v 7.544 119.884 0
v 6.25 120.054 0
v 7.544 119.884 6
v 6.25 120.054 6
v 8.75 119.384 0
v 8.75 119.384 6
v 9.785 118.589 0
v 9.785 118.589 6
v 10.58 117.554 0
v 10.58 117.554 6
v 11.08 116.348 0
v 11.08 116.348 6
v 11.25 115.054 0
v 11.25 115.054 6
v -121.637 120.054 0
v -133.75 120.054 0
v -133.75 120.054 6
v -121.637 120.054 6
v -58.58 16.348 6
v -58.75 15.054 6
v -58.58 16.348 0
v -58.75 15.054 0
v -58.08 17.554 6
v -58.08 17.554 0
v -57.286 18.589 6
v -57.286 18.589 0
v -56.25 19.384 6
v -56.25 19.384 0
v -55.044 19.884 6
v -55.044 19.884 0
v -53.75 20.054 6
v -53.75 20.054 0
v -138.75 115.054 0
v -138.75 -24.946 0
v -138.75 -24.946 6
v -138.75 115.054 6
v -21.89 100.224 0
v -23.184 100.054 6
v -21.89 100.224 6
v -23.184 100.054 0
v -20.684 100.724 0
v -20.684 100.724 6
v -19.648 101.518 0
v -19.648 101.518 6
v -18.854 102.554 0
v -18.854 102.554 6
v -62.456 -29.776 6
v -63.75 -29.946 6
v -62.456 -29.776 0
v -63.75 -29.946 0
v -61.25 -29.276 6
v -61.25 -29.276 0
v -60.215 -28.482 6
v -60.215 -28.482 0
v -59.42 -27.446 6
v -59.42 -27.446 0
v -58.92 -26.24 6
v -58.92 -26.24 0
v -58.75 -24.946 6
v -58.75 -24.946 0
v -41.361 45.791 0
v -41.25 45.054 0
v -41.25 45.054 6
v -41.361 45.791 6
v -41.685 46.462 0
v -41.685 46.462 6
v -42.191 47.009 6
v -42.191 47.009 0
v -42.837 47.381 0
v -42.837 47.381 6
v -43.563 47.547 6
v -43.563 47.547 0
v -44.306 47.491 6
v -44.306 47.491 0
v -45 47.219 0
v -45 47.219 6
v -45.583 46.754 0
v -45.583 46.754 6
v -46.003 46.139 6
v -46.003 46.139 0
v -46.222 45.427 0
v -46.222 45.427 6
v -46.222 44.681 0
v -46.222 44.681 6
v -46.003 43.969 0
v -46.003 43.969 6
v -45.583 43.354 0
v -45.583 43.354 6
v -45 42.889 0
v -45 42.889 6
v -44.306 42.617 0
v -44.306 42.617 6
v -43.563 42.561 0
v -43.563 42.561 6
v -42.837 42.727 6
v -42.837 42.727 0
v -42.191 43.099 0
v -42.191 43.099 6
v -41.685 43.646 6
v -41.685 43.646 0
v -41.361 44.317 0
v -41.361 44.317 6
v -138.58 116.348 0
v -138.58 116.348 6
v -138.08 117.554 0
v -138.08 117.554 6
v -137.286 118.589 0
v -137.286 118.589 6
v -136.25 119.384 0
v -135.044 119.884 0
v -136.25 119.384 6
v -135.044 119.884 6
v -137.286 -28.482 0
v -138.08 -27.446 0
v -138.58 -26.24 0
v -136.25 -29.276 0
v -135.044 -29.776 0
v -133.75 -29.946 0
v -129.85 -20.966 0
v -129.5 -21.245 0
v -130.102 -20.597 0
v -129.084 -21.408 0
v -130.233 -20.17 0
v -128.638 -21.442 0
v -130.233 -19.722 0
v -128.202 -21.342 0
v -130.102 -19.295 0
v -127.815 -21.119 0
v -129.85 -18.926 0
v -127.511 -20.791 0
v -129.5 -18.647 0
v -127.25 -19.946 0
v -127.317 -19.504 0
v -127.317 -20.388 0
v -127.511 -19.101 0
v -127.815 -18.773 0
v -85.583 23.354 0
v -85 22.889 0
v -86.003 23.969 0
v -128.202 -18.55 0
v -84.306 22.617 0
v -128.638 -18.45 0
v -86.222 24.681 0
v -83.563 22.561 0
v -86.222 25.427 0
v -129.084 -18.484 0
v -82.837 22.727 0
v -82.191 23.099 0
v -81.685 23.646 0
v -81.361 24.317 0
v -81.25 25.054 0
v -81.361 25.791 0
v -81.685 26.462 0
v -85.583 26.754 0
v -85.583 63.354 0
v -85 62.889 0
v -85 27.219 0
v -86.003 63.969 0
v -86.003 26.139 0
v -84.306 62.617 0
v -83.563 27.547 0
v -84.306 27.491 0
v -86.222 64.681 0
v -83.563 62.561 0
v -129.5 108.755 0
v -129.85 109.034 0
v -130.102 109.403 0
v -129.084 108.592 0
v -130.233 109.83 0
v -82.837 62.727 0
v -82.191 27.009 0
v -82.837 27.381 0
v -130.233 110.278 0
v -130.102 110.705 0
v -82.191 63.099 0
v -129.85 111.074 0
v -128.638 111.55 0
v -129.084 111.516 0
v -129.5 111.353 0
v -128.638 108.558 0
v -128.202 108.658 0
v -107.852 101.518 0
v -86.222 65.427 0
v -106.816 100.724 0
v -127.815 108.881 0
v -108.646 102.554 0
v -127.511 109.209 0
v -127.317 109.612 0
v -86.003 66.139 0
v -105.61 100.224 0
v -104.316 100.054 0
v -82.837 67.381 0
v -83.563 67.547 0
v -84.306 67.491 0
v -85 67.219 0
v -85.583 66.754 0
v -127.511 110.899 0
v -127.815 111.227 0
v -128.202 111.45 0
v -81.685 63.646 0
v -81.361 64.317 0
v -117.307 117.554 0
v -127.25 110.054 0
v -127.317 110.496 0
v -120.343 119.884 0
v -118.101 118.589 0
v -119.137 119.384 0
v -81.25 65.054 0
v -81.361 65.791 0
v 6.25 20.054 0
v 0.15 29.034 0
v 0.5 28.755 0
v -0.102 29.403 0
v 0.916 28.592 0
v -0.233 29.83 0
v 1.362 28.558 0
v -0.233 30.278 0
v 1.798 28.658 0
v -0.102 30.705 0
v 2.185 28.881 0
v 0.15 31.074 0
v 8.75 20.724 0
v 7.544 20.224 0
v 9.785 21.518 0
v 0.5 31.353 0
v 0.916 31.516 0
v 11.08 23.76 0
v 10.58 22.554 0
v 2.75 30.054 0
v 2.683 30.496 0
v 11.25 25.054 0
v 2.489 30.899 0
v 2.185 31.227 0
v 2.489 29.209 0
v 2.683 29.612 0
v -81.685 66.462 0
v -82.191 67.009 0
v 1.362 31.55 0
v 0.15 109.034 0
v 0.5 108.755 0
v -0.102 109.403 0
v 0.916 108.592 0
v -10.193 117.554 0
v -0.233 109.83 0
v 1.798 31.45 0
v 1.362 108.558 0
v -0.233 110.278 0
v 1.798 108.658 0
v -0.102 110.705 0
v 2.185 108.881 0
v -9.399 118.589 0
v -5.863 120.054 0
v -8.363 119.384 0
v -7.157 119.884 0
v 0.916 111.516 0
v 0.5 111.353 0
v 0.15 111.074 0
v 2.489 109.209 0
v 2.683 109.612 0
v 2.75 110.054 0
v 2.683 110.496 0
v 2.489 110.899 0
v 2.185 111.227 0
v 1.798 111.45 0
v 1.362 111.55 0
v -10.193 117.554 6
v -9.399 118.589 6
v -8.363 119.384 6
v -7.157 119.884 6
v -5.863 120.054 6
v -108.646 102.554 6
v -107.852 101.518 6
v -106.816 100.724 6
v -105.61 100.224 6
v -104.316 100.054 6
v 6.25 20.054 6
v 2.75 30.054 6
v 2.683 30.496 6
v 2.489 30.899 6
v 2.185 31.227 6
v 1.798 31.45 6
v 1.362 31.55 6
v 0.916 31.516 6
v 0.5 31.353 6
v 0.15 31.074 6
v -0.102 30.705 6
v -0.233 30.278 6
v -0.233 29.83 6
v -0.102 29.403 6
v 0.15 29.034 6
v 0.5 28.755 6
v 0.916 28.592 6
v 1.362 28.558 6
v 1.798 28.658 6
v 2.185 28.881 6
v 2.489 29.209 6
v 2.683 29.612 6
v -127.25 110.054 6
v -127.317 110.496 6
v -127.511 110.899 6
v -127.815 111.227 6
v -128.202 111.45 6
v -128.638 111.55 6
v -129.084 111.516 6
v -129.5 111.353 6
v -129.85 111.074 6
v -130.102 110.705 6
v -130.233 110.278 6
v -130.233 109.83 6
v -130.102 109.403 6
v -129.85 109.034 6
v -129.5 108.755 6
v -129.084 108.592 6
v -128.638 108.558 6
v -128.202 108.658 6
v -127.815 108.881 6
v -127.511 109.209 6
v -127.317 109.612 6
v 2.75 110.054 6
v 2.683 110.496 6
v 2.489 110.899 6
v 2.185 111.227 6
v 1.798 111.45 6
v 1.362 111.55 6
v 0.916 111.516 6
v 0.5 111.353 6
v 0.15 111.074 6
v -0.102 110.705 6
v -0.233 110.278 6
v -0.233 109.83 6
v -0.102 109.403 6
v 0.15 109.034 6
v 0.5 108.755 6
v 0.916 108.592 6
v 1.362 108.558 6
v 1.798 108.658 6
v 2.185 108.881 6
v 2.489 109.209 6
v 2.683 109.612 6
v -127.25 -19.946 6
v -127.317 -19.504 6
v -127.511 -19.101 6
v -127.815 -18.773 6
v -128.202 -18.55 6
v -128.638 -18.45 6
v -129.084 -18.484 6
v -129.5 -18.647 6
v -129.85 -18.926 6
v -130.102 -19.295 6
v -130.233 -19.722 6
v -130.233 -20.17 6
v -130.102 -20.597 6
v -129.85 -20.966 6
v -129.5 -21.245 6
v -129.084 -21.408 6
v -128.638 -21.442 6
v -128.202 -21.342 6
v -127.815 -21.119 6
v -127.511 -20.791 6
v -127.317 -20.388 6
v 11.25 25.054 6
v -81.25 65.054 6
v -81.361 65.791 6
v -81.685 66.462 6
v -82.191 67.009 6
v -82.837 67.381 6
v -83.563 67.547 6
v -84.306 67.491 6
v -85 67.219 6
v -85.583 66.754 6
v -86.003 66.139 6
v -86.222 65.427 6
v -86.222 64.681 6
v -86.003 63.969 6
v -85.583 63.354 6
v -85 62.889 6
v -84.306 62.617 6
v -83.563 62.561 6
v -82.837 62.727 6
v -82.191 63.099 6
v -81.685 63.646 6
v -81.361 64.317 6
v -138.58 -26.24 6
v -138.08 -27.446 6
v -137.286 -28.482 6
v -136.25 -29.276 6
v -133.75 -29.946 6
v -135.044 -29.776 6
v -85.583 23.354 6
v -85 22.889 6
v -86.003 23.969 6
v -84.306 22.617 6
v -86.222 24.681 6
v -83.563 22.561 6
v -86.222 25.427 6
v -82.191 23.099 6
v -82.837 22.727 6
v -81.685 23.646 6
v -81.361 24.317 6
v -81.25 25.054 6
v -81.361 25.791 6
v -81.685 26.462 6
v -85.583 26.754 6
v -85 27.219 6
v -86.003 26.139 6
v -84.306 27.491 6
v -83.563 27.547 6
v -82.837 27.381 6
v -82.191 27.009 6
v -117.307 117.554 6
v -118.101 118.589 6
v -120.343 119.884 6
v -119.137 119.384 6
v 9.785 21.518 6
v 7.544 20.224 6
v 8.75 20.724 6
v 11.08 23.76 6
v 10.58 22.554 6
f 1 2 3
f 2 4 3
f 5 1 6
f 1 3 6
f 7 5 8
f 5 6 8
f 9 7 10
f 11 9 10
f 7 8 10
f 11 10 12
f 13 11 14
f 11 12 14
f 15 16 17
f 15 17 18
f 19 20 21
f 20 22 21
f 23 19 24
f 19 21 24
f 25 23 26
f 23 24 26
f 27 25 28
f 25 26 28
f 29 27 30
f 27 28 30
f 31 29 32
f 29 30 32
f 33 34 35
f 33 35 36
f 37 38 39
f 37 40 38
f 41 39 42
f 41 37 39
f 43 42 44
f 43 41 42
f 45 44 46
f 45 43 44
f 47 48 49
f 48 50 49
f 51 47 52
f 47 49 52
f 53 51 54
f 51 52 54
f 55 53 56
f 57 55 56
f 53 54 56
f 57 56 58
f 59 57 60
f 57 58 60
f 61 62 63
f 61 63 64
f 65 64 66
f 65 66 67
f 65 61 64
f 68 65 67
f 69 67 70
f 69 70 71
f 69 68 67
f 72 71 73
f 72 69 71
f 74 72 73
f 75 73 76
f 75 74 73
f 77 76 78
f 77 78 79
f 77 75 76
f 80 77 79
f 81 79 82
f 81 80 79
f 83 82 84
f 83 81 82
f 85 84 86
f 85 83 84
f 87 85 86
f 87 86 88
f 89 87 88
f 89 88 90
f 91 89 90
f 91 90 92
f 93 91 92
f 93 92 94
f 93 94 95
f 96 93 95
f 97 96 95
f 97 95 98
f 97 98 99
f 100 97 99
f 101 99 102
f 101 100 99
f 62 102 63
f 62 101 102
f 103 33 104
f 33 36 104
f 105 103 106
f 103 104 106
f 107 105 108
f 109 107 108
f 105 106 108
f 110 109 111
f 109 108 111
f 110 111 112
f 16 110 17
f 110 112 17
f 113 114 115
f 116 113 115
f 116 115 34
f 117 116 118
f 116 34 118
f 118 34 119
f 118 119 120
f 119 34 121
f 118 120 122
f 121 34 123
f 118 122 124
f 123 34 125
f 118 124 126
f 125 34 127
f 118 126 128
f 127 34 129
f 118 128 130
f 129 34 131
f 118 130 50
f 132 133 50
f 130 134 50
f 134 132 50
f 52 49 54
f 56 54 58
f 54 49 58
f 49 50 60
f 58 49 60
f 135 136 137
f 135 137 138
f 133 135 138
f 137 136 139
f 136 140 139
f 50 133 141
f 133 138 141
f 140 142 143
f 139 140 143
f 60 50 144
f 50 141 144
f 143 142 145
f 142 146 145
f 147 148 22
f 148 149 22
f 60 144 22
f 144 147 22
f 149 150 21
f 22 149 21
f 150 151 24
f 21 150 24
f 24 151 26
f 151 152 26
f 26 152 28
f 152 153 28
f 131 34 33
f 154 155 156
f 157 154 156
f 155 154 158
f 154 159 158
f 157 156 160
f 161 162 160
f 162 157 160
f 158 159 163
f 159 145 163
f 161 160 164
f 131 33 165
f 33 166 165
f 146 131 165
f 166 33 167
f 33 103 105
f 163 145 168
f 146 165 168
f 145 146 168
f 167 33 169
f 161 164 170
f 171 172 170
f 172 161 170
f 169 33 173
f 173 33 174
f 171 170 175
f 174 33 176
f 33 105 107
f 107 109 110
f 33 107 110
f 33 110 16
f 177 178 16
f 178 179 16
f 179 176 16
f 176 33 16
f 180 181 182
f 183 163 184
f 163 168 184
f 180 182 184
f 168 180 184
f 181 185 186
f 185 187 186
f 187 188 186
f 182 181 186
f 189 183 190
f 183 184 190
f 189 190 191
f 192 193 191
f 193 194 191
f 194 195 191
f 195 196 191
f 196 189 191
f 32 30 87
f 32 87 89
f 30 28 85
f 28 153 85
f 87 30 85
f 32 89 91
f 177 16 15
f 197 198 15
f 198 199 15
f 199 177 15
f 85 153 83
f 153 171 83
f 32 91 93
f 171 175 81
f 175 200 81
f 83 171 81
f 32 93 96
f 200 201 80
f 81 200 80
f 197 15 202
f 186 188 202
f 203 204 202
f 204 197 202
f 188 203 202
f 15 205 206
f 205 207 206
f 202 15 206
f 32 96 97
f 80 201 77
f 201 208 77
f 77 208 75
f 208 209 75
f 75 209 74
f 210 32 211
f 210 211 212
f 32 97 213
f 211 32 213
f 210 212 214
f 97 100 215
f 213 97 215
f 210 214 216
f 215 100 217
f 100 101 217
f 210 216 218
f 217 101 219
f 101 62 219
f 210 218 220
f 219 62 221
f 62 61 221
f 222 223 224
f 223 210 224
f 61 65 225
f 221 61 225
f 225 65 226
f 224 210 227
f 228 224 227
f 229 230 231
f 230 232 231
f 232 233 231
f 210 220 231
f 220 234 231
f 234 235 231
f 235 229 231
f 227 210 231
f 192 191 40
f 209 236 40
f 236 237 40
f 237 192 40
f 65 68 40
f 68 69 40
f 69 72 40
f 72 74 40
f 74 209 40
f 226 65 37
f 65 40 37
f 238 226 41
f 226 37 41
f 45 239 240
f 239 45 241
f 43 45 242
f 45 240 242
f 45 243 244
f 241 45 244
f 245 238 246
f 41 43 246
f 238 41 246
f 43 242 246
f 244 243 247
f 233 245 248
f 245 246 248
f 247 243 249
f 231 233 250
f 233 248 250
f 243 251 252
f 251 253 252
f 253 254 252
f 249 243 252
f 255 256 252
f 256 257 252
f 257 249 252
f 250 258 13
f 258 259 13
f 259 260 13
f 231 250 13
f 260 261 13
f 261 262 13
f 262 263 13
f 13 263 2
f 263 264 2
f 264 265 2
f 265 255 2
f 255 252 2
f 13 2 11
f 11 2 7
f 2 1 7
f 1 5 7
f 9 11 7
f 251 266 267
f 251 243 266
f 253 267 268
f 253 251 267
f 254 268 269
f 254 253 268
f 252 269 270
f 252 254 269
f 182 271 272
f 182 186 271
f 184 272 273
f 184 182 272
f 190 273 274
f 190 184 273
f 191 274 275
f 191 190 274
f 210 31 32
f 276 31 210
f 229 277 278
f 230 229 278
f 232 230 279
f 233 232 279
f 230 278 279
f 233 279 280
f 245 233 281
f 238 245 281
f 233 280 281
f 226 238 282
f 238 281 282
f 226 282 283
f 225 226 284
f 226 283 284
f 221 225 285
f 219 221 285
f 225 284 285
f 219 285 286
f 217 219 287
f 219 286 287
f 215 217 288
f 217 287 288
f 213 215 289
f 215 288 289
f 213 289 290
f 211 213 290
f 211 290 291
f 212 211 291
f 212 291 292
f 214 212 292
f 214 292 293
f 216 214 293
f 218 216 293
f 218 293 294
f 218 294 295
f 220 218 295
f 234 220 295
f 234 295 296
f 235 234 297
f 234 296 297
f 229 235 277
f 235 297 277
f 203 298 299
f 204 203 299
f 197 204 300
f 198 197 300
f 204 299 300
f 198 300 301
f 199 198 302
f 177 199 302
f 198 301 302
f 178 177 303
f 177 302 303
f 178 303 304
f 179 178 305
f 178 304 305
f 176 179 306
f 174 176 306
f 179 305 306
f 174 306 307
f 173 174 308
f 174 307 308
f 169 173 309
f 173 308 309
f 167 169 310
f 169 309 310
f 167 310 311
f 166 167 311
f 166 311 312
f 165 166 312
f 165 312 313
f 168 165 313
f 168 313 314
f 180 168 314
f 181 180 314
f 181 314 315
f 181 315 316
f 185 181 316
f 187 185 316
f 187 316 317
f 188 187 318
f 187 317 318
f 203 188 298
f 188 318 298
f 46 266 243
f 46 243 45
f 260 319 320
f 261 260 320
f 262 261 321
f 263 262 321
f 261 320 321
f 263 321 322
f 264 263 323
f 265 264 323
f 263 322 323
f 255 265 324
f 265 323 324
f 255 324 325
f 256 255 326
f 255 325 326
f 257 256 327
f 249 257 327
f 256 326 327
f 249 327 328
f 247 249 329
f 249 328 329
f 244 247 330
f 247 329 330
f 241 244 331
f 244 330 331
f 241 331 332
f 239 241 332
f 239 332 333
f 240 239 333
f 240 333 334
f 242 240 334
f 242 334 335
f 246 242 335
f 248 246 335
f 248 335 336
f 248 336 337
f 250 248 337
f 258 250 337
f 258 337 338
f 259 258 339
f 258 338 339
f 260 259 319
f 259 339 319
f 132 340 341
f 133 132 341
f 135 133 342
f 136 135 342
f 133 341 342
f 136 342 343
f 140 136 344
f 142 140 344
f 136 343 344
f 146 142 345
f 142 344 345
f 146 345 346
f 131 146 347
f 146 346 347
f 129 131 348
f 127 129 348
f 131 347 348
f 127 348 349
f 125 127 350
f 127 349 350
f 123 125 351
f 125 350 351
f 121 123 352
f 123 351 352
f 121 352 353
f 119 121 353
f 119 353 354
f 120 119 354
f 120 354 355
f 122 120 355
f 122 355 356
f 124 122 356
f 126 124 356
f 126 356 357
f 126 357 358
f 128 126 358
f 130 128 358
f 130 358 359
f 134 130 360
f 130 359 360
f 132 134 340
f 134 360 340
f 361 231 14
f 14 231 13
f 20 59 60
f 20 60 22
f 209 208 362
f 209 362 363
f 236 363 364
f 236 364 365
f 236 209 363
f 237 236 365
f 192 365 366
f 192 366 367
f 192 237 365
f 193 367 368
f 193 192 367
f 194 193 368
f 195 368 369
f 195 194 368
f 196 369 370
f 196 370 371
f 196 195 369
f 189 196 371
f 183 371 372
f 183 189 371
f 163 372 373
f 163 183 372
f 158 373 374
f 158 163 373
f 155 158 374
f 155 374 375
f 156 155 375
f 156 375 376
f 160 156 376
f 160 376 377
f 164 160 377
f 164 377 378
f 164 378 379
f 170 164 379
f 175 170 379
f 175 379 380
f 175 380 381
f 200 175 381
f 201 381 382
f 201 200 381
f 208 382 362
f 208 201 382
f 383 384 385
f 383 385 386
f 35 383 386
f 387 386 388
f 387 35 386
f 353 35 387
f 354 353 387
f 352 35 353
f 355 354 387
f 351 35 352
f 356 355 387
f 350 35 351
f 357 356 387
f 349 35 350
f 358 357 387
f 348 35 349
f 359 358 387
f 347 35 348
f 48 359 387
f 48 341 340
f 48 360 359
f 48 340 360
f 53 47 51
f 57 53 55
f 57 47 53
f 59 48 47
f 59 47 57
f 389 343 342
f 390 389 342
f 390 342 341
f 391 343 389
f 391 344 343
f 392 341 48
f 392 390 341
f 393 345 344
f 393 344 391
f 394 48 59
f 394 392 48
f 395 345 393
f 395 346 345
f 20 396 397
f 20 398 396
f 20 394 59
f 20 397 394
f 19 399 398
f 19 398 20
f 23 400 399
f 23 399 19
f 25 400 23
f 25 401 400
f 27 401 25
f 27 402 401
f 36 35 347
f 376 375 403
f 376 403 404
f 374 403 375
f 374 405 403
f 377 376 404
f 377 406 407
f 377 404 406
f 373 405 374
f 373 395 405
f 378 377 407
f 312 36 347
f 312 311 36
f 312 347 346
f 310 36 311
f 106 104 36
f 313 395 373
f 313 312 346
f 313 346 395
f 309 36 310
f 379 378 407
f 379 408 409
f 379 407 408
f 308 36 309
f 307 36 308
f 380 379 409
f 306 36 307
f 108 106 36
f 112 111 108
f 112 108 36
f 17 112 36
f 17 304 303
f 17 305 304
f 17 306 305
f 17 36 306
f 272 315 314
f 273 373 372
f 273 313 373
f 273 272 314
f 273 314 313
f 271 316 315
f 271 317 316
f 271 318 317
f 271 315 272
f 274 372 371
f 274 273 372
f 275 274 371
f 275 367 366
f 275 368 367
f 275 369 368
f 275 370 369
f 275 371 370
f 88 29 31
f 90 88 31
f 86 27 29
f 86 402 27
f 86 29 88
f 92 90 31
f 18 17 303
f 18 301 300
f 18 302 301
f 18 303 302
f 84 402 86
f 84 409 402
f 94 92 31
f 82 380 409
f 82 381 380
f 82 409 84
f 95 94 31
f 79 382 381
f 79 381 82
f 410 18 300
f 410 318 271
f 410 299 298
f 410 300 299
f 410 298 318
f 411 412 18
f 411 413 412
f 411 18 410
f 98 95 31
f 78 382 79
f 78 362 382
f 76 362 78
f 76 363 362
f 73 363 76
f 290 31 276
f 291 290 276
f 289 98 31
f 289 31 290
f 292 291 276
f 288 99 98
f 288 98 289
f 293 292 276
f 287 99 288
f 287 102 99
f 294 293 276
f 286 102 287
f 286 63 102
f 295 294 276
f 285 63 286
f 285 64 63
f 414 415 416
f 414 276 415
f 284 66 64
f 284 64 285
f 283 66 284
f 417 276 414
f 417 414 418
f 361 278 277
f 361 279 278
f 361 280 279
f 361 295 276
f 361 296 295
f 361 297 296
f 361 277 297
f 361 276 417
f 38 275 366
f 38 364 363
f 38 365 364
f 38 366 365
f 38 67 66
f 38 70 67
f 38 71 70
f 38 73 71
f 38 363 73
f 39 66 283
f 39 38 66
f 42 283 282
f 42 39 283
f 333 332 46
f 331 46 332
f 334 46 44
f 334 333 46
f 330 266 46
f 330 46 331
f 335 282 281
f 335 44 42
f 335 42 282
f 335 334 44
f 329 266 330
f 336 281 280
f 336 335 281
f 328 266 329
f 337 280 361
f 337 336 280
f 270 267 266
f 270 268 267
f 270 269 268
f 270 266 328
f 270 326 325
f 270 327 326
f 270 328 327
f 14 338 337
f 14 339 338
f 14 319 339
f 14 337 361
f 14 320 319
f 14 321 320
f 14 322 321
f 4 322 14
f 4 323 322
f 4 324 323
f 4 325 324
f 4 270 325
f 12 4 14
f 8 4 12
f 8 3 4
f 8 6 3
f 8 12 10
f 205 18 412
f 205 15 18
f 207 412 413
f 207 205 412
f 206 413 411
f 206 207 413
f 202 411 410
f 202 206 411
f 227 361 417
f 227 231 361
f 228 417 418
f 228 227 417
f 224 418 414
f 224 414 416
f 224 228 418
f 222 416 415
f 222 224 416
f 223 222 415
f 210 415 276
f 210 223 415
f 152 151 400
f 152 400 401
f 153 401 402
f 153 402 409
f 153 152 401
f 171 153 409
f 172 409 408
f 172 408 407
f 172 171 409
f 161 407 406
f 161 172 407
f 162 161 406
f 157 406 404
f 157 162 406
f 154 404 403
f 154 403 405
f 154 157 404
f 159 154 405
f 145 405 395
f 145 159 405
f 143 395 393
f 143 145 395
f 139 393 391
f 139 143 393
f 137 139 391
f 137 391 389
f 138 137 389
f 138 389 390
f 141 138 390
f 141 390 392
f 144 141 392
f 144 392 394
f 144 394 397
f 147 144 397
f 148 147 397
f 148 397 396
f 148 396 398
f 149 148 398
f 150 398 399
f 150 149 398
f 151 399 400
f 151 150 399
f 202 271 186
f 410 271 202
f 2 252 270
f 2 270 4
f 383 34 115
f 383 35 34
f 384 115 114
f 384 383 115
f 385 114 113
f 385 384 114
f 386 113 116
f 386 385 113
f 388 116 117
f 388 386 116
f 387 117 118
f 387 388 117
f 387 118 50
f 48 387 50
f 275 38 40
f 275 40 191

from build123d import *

# Parameters (mm, degrees)
ESBO_O1_W                = 150
ESBO_O1_H                = 150
ESBO_O1_R                = 2.5
RESSALTO_EXTRUS_O1_DEPTH = 6
CORTE_EXTRUS_O1_DEPTH    = 6
ESBO_O3_W                = 70
ESBO_O3_H                = 50
CORTE_EXTRUS_O2_DEPTH    = 6
FILETE1_R                = 5
ESBO_O4_R                = 1.5
CORTE_EXTRUS_O3_DEPTH    = 6


with BuildPart() as part:
    # Esboço1 → Ressalto-extrusão1 (new body)
    with BuildSketch(Plane.XY):
        with Locations((-63.750118326, 45.053956835)):
            Rectangle(ESBO_O1_W, ESBO_O1_H)
        with Locations((-83.750118326, 65.053956835)):
            Circle(ESBO_O1_R, mode=Mode.SUBTRACT)
        with Locations((-83.750118326, 25.053956835)):
            Circle(ESBO_O1_R, mode=Mode.SUBTRACT)
        with Locations((-43.750118326, 45.053956835)):
            Circle(ESBO_O1_R, mode=Mode.SUBTRACT)
    extrude(amount=RESSALTO_EXTRUS_O1_DEPTH)

    # Esboço2 → Corte-extrusão1 (cut)
    with BuildSketch(Plane.XY.offset(6)):
        Polygon((-8.750118326, 120.053956835), (-20.29712371, 100.053956835), (-107.203112943, 100.053956835), (-118.750118326, 120.053956835), align=None)
    extrude(amount=-CORTE_EXTRUS_O1_DEPTH, mode=Mode.SUBTRACT)

    # Esboço3 → Corte-extrusão2 (cut)
    with BuildSketch(Plane.XY.offset(6)):
        with Locations((-23.750118326, -4.946043165)):
            Rectangle(ESBO_O3_W, ESBO_O3_H)
    extrude(amount=-CORTE_EXTRUS_O2_DEPTH, mode=Mode.SUBTRACT)

    # Filete1
    filete1_edges = [part.edges().sort_by_distance(p)[0] for p in [
        (-20.29712371, 100.053956835, 3),
        (-107.203112943, 100.053956835, 3),
        (-118.750118326, 120.053956835, 3),
        (-8.750118326, 120.053956835, 3),
        (-58.750118326, -29.946043165, 3),
        (-58.750118326, 20.053956835, 3),
        (11.249881674, 20.053956835, 3),
        (-138.750118326, -29.946043165, 3),
        (-138.750118326, 120.053956835, 3),
        (11.249881674, 120.053956835, 3),
    ]]
    fillet(filete1_edges, radius=FILETE1_R)

    # Esboço4 → Corte-extrusão3 (cut)
    with BuildSketch(Plane.XY.offset(6)):
        with Locations((1.249881674, 110.053956835)):
            Circle(ESBO_O4_R)
        with Locations((1.249881674, 30.053956835)):
            Circle(ESBO_O4_R)
        with Locations((-128.750118326, 110.053956835)):
            Circle(ESBO_O4_R)
        with Locations((-128.750118326, -19.946043165)):
            Circle(ESBO_O4_R)
    extrude(amount=-CORTE_EXTRUS_O3_DEPTH, mode=Mode.SUBTRACT)


solid = part.part
